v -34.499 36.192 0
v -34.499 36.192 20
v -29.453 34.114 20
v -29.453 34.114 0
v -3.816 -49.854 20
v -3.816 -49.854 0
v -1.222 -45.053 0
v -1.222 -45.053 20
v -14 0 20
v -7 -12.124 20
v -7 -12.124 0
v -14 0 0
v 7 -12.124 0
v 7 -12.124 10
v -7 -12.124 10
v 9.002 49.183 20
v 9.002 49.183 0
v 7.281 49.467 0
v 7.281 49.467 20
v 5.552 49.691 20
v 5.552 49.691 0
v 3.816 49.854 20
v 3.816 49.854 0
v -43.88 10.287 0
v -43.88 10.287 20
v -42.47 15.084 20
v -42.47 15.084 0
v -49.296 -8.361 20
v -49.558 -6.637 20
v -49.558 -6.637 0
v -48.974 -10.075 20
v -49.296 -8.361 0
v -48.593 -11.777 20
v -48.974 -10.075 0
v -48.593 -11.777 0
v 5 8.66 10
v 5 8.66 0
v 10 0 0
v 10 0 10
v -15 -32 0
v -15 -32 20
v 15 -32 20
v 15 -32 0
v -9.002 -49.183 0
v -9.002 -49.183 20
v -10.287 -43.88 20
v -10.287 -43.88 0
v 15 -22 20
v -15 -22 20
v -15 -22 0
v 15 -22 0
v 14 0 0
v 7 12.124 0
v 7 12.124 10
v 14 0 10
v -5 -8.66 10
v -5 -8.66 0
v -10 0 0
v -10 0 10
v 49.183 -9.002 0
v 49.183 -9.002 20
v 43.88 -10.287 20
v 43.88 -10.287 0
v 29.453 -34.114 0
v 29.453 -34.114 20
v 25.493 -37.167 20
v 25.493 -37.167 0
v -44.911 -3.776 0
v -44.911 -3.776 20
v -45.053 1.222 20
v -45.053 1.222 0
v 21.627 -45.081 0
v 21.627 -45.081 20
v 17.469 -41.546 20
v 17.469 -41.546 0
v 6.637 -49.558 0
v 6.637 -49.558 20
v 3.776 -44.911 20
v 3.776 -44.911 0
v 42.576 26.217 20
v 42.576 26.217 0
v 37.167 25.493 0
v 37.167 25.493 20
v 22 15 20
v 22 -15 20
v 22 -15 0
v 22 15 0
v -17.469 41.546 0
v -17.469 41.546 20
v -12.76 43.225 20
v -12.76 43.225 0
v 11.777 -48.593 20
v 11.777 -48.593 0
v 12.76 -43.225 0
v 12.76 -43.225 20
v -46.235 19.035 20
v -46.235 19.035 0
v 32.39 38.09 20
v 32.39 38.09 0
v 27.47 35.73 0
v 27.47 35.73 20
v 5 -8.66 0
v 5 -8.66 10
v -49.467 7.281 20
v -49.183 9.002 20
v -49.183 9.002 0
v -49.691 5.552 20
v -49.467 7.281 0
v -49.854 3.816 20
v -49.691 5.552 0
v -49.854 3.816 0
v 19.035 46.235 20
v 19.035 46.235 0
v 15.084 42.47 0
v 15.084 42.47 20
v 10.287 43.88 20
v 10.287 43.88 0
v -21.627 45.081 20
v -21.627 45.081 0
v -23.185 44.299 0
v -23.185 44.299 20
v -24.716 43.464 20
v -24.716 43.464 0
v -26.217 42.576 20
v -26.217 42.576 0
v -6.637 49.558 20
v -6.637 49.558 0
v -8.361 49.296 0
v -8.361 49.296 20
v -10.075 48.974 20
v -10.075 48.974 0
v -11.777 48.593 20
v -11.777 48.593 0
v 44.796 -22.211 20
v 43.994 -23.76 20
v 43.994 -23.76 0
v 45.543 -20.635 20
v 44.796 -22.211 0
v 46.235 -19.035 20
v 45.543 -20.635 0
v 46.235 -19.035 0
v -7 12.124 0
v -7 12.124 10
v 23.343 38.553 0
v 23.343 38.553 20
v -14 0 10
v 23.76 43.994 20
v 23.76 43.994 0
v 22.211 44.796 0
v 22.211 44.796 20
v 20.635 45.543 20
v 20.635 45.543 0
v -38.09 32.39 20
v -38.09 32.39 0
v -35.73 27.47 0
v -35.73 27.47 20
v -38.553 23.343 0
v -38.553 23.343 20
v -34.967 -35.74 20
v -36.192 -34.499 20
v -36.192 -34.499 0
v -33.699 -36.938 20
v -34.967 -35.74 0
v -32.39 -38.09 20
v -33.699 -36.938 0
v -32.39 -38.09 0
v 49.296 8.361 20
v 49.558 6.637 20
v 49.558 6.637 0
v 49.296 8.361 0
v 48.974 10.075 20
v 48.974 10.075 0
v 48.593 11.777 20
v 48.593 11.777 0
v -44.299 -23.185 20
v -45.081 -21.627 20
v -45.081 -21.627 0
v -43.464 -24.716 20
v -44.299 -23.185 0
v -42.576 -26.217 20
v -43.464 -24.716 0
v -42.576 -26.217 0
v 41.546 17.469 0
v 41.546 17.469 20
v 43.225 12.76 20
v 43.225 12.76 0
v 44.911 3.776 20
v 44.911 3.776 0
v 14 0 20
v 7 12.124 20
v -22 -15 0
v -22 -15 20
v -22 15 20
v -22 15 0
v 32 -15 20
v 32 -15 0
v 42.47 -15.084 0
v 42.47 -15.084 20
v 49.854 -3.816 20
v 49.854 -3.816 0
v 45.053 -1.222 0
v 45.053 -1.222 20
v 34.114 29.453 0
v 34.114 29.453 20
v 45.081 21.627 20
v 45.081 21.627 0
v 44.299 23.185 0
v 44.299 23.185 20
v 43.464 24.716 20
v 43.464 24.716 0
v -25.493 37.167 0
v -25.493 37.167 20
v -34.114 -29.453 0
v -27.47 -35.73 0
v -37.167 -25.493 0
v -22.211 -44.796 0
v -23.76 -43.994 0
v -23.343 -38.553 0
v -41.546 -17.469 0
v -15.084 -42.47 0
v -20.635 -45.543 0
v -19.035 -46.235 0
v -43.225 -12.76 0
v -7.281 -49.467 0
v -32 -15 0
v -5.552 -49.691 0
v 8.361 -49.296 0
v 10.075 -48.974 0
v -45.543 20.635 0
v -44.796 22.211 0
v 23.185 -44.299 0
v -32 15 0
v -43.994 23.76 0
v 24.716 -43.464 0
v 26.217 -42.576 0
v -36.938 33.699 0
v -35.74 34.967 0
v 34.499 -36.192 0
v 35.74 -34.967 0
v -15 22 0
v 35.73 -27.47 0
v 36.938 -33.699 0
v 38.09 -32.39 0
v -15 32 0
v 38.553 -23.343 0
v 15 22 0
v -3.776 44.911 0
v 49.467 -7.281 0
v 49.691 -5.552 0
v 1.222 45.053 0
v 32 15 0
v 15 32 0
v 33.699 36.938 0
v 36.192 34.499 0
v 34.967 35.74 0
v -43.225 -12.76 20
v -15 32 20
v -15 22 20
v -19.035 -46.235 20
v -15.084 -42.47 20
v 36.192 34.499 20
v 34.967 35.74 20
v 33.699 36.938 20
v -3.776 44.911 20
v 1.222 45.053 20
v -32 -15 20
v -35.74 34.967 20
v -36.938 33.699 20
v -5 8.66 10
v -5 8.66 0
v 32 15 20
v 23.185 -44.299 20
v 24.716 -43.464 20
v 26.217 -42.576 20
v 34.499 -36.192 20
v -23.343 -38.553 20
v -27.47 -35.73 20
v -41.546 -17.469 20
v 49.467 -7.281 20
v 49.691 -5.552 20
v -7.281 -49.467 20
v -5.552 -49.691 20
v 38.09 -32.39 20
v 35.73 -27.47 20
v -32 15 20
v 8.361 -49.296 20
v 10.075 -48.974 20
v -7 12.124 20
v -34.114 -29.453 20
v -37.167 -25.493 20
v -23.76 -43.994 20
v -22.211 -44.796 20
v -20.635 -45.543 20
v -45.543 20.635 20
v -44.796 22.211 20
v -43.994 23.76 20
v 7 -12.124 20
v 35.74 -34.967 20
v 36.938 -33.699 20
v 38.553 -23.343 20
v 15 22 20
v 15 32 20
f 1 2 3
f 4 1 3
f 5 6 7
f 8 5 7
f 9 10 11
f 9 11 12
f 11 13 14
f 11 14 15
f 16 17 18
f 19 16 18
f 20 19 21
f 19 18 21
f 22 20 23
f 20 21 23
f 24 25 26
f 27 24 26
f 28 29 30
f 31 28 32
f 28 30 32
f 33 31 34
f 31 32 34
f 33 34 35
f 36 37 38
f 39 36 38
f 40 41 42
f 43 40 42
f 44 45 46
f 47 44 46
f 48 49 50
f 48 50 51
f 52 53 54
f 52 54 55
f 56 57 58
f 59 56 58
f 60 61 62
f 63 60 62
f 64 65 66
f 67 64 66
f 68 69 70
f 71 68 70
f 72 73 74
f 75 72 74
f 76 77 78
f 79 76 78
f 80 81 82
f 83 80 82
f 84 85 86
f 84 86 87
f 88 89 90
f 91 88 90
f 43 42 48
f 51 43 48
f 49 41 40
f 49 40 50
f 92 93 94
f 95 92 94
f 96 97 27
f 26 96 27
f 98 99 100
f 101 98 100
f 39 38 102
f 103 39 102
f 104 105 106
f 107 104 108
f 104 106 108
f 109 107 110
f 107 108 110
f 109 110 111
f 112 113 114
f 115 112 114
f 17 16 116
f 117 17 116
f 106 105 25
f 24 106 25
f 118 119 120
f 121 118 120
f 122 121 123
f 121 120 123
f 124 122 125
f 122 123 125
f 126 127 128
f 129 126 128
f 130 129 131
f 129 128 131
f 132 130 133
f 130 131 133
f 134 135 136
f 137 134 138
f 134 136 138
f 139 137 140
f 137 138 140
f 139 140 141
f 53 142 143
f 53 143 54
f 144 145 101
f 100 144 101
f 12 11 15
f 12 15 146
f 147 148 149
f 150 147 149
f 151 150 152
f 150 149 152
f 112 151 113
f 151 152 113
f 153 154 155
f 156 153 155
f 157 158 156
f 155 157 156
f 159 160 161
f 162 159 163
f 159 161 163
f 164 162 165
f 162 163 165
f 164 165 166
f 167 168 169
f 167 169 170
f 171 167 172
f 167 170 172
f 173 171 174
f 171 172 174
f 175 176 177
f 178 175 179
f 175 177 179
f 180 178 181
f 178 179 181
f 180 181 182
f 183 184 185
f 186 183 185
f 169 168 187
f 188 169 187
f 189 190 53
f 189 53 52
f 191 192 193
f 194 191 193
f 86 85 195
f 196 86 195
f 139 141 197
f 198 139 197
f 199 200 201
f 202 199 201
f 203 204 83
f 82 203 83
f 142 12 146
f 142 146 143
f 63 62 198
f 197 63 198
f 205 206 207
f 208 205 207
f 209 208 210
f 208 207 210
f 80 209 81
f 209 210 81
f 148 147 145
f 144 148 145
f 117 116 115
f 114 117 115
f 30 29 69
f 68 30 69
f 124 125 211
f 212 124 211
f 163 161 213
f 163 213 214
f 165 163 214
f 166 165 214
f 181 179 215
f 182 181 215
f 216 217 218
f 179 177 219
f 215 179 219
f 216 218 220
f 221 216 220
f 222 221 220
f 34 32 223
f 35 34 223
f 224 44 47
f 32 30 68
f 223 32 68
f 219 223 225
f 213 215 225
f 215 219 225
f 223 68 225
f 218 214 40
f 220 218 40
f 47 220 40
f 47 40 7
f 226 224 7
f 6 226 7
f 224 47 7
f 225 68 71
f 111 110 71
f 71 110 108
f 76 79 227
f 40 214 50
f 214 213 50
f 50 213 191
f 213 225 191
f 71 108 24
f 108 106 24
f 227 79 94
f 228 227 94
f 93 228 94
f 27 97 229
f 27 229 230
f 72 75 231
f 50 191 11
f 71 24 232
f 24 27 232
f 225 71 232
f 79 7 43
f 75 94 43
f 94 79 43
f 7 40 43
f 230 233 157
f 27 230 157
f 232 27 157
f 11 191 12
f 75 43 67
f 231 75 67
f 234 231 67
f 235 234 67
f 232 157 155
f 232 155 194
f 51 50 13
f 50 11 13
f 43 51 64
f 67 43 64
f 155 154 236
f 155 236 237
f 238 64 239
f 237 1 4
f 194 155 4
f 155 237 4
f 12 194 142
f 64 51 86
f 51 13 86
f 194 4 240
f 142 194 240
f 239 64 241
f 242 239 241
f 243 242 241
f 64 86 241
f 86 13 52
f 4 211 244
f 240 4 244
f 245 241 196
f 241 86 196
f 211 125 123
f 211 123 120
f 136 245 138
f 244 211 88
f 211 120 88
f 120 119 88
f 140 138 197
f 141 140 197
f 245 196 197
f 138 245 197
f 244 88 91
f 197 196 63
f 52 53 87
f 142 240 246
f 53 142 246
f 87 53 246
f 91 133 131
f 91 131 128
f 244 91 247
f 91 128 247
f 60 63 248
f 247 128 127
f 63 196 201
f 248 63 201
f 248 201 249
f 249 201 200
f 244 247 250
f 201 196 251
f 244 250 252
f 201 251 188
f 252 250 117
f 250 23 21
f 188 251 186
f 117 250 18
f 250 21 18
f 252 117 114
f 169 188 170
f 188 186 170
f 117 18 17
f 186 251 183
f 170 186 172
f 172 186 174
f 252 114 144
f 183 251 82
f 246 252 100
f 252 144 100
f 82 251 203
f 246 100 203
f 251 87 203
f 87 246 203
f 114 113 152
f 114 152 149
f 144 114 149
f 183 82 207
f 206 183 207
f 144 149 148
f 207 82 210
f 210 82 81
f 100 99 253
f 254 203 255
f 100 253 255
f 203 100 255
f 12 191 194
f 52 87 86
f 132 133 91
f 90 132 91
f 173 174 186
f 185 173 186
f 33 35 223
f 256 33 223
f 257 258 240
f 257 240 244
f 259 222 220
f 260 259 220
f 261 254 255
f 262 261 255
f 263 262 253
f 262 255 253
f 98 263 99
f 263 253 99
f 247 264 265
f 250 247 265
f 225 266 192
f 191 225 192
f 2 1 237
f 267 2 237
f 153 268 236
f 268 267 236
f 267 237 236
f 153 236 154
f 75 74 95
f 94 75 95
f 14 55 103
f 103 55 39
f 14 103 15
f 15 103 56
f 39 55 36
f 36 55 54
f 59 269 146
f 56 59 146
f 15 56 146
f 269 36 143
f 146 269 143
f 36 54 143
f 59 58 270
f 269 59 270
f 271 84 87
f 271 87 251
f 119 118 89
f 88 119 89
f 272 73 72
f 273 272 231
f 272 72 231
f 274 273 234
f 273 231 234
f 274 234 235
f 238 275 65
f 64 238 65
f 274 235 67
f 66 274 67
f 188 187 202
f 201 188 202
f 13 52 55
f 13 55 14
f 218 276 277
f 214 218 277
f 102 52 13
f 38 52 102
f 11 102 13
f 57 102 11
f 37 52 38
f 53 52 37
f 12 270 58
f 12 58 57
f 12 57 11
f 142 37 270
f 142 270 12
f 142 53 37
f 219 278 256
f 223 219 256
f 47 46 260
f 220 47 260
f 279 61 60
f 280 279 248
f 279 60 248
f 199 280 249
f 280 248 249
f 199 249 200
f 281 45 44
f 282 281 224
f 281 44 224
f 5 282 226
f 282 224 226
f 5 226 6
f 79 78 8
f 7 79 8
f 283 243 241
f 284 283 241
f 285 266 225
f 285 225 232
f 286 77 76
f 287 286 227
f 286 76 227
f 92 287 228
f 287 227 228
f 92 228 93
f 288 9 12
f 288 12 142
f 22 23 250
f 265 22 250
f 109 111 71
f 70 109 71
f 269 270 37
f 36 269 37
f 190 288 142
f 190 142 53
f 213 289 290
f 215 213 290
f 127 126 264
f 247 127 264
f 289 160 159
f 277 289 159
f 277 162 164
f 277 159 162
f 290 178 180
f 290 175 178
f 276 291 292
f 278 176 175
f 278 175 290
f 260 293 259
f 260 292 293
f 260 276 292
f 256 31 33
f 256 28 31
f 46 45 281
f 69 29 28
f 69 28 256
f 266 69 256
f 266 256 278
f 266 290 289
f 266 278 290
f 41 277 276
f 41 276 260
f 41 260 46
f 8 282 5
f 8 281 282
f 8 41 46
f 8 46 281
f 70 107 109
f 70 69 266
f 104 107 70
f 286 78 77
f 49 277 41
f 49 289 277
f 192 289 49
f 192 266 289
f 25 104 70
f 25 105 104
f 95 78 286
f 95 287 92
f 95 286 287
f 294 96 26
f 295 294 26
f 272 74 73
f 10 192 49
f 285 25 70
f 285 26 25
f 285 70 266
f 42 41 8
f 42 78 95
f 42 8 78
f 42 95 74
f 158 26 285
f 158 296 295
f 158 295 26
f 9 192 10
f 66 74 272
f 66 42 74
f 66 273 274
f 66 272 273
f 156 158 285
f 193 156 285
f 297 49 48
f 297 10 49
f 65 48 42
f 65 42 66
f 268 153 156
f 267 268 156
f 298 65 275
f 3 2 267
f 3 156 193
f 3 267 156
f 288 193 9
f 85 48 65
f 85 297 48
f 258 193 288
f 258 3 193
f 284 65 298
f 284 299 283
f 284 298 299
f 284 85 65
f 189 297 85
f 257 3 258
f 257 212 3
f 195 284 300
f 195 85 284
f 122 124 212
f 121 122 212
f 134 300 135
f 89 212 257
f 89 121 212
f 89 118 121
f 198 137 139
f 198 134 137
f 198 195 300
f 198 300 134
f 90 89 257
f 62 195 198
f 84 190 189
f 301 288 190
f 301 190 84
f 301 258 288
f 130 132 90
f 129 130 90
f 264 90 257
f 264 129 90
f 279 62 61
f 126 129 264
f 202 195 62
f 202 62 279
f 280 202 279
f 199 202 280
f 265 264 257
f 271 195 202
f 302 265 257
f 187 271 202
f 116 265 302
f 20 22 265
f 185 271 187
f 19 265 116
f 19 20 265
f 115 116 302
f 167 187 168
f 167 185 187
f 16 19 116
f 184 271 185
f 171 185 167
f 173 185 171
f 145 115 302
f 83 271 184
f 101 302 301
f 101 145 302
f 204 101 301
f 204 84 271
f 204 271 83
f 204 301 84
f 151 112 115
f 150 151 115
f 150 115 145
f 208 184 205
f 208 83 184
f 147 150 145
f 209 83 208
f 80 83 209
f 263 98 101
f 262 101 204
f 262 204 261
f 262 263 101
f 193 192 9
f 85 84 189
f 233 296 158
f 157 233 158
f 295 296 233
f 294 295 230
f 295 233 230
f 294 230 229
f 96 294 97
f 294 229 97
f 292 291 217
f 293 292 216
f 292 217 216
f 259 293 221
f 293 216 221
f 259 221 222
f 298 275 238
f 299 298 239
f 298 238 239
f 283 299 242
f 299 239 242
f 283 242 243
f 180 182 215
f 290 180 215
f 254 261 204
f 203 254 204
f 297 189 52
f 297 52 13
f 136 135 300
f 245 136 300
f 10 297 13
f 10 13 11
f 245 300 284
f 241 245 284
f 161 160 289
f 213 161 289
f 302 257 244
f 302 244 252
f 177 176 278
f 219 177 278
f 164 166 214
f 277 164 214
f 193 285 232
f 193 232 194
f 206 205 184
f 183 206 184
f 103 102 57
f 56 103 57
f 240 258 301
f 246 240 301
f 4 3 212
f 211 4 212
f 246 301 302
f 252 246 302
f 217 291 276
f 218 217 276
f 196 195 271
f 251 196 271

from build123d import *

# Parameters (mm, degrees)
SKETCH_R           = 50
PAD_DEPTH          = 20
POCKET_DEPTH       = 20
POLARPATTERN_COUNT = 20
SKETCH003_W        = 30
SKETCH003_H        = 10
SKETCH003_W_2      = 10
SKETCH003_H_2      = 30
POCKET001_DEPTH    = 20
PAD001_DEPTH       = 10


with BuildPart() as nutpad:
    # Sketch → Pad (new body)
    with BuildSketch(Plane.XY):
        Circle(SKETCH_R)
    extrude(amount=PAD_DEPTH)

    # Sketch002 → Pocket (cut)
    with BuildSketch(Plane.XY.offset(20)):
        with BuildLine():
            ThreePointArc((48.5932290893, 11.7770151853), (47.0953000791, 16.7938295353), (45.0809764245, 21.6265014419))
            Line((45.0809764245, 21.6265014419), (41.5460785944, 17.4692115857))
            Line((41.5460785944, 17.4692115857), (43.2254615479, 12.7596815778))
            Line((48.5932290893, 11.7770151853), (43.2254615479, 12.7596815778))
        make_face()
    pocket = extrude(amount=-POCKET_DEPTH, mode=Mode.SUBTRACT)

    # PolarPattern: Pocket ×20 about axis
    polarpattern_axis = Axis((0, 0, 20), (0, 0, 1))
    for i in range(1, POLARPATTERN_COUNT):
        add(pocket.rotate(polarpattern_axis, i * 360 / POLARPATTERN_COUNT), mode=Mode.SUBTRACT)

    # Sketch003 → Pocket001 (cut)
    with BuildSketch(Plane.XY.offset(20)):
        Polygon((-7, 12.124355653), (7, 12.124355653), (14, 0), (7, -12.124355653), (-7, -12.124355653), (-14, 0), align=None)
        with Locations((0, -27)):
            Rectangle(SKETCH003_W, SKETCH003_H)
        with Locations((0, 27)):
            Rectangle(SKETCH003_W, SKETCH003_H)
        with Locations((-27, 0)):
            Rectangle(SKETCH003_W_2, SKETCH003_H_2)
        with Locations((27, 0)):
            Rectangle(SKETCH003_W_2, SKETCH003_H_2)
    extrude(amount=-POCKET001_DEPTH, mode=Mode.SUBTRACT)


with BuildPart() as nutbreak:
    # Sketch004 → Pad001 (new body)
    with BuildSketch(Plane.XY):
        Polygon((-7, 12.124355653), (7, 12.124355653), (14, 0), (7, -12.124355653), (-7, -12.124355653), (-14, 0), align=None)
        Polygon((-5, 8.6602540378), (5, 8.6602540378), (10, 0), (5, -8.6602540378), (-5, -8.6602540378), (-10, 0), align=None, mode=Mode.SUBTRACT)
    extrude(amount=PAD001_DEPTH)


solid = Compound([nutpad.part, nutbreak.part])
